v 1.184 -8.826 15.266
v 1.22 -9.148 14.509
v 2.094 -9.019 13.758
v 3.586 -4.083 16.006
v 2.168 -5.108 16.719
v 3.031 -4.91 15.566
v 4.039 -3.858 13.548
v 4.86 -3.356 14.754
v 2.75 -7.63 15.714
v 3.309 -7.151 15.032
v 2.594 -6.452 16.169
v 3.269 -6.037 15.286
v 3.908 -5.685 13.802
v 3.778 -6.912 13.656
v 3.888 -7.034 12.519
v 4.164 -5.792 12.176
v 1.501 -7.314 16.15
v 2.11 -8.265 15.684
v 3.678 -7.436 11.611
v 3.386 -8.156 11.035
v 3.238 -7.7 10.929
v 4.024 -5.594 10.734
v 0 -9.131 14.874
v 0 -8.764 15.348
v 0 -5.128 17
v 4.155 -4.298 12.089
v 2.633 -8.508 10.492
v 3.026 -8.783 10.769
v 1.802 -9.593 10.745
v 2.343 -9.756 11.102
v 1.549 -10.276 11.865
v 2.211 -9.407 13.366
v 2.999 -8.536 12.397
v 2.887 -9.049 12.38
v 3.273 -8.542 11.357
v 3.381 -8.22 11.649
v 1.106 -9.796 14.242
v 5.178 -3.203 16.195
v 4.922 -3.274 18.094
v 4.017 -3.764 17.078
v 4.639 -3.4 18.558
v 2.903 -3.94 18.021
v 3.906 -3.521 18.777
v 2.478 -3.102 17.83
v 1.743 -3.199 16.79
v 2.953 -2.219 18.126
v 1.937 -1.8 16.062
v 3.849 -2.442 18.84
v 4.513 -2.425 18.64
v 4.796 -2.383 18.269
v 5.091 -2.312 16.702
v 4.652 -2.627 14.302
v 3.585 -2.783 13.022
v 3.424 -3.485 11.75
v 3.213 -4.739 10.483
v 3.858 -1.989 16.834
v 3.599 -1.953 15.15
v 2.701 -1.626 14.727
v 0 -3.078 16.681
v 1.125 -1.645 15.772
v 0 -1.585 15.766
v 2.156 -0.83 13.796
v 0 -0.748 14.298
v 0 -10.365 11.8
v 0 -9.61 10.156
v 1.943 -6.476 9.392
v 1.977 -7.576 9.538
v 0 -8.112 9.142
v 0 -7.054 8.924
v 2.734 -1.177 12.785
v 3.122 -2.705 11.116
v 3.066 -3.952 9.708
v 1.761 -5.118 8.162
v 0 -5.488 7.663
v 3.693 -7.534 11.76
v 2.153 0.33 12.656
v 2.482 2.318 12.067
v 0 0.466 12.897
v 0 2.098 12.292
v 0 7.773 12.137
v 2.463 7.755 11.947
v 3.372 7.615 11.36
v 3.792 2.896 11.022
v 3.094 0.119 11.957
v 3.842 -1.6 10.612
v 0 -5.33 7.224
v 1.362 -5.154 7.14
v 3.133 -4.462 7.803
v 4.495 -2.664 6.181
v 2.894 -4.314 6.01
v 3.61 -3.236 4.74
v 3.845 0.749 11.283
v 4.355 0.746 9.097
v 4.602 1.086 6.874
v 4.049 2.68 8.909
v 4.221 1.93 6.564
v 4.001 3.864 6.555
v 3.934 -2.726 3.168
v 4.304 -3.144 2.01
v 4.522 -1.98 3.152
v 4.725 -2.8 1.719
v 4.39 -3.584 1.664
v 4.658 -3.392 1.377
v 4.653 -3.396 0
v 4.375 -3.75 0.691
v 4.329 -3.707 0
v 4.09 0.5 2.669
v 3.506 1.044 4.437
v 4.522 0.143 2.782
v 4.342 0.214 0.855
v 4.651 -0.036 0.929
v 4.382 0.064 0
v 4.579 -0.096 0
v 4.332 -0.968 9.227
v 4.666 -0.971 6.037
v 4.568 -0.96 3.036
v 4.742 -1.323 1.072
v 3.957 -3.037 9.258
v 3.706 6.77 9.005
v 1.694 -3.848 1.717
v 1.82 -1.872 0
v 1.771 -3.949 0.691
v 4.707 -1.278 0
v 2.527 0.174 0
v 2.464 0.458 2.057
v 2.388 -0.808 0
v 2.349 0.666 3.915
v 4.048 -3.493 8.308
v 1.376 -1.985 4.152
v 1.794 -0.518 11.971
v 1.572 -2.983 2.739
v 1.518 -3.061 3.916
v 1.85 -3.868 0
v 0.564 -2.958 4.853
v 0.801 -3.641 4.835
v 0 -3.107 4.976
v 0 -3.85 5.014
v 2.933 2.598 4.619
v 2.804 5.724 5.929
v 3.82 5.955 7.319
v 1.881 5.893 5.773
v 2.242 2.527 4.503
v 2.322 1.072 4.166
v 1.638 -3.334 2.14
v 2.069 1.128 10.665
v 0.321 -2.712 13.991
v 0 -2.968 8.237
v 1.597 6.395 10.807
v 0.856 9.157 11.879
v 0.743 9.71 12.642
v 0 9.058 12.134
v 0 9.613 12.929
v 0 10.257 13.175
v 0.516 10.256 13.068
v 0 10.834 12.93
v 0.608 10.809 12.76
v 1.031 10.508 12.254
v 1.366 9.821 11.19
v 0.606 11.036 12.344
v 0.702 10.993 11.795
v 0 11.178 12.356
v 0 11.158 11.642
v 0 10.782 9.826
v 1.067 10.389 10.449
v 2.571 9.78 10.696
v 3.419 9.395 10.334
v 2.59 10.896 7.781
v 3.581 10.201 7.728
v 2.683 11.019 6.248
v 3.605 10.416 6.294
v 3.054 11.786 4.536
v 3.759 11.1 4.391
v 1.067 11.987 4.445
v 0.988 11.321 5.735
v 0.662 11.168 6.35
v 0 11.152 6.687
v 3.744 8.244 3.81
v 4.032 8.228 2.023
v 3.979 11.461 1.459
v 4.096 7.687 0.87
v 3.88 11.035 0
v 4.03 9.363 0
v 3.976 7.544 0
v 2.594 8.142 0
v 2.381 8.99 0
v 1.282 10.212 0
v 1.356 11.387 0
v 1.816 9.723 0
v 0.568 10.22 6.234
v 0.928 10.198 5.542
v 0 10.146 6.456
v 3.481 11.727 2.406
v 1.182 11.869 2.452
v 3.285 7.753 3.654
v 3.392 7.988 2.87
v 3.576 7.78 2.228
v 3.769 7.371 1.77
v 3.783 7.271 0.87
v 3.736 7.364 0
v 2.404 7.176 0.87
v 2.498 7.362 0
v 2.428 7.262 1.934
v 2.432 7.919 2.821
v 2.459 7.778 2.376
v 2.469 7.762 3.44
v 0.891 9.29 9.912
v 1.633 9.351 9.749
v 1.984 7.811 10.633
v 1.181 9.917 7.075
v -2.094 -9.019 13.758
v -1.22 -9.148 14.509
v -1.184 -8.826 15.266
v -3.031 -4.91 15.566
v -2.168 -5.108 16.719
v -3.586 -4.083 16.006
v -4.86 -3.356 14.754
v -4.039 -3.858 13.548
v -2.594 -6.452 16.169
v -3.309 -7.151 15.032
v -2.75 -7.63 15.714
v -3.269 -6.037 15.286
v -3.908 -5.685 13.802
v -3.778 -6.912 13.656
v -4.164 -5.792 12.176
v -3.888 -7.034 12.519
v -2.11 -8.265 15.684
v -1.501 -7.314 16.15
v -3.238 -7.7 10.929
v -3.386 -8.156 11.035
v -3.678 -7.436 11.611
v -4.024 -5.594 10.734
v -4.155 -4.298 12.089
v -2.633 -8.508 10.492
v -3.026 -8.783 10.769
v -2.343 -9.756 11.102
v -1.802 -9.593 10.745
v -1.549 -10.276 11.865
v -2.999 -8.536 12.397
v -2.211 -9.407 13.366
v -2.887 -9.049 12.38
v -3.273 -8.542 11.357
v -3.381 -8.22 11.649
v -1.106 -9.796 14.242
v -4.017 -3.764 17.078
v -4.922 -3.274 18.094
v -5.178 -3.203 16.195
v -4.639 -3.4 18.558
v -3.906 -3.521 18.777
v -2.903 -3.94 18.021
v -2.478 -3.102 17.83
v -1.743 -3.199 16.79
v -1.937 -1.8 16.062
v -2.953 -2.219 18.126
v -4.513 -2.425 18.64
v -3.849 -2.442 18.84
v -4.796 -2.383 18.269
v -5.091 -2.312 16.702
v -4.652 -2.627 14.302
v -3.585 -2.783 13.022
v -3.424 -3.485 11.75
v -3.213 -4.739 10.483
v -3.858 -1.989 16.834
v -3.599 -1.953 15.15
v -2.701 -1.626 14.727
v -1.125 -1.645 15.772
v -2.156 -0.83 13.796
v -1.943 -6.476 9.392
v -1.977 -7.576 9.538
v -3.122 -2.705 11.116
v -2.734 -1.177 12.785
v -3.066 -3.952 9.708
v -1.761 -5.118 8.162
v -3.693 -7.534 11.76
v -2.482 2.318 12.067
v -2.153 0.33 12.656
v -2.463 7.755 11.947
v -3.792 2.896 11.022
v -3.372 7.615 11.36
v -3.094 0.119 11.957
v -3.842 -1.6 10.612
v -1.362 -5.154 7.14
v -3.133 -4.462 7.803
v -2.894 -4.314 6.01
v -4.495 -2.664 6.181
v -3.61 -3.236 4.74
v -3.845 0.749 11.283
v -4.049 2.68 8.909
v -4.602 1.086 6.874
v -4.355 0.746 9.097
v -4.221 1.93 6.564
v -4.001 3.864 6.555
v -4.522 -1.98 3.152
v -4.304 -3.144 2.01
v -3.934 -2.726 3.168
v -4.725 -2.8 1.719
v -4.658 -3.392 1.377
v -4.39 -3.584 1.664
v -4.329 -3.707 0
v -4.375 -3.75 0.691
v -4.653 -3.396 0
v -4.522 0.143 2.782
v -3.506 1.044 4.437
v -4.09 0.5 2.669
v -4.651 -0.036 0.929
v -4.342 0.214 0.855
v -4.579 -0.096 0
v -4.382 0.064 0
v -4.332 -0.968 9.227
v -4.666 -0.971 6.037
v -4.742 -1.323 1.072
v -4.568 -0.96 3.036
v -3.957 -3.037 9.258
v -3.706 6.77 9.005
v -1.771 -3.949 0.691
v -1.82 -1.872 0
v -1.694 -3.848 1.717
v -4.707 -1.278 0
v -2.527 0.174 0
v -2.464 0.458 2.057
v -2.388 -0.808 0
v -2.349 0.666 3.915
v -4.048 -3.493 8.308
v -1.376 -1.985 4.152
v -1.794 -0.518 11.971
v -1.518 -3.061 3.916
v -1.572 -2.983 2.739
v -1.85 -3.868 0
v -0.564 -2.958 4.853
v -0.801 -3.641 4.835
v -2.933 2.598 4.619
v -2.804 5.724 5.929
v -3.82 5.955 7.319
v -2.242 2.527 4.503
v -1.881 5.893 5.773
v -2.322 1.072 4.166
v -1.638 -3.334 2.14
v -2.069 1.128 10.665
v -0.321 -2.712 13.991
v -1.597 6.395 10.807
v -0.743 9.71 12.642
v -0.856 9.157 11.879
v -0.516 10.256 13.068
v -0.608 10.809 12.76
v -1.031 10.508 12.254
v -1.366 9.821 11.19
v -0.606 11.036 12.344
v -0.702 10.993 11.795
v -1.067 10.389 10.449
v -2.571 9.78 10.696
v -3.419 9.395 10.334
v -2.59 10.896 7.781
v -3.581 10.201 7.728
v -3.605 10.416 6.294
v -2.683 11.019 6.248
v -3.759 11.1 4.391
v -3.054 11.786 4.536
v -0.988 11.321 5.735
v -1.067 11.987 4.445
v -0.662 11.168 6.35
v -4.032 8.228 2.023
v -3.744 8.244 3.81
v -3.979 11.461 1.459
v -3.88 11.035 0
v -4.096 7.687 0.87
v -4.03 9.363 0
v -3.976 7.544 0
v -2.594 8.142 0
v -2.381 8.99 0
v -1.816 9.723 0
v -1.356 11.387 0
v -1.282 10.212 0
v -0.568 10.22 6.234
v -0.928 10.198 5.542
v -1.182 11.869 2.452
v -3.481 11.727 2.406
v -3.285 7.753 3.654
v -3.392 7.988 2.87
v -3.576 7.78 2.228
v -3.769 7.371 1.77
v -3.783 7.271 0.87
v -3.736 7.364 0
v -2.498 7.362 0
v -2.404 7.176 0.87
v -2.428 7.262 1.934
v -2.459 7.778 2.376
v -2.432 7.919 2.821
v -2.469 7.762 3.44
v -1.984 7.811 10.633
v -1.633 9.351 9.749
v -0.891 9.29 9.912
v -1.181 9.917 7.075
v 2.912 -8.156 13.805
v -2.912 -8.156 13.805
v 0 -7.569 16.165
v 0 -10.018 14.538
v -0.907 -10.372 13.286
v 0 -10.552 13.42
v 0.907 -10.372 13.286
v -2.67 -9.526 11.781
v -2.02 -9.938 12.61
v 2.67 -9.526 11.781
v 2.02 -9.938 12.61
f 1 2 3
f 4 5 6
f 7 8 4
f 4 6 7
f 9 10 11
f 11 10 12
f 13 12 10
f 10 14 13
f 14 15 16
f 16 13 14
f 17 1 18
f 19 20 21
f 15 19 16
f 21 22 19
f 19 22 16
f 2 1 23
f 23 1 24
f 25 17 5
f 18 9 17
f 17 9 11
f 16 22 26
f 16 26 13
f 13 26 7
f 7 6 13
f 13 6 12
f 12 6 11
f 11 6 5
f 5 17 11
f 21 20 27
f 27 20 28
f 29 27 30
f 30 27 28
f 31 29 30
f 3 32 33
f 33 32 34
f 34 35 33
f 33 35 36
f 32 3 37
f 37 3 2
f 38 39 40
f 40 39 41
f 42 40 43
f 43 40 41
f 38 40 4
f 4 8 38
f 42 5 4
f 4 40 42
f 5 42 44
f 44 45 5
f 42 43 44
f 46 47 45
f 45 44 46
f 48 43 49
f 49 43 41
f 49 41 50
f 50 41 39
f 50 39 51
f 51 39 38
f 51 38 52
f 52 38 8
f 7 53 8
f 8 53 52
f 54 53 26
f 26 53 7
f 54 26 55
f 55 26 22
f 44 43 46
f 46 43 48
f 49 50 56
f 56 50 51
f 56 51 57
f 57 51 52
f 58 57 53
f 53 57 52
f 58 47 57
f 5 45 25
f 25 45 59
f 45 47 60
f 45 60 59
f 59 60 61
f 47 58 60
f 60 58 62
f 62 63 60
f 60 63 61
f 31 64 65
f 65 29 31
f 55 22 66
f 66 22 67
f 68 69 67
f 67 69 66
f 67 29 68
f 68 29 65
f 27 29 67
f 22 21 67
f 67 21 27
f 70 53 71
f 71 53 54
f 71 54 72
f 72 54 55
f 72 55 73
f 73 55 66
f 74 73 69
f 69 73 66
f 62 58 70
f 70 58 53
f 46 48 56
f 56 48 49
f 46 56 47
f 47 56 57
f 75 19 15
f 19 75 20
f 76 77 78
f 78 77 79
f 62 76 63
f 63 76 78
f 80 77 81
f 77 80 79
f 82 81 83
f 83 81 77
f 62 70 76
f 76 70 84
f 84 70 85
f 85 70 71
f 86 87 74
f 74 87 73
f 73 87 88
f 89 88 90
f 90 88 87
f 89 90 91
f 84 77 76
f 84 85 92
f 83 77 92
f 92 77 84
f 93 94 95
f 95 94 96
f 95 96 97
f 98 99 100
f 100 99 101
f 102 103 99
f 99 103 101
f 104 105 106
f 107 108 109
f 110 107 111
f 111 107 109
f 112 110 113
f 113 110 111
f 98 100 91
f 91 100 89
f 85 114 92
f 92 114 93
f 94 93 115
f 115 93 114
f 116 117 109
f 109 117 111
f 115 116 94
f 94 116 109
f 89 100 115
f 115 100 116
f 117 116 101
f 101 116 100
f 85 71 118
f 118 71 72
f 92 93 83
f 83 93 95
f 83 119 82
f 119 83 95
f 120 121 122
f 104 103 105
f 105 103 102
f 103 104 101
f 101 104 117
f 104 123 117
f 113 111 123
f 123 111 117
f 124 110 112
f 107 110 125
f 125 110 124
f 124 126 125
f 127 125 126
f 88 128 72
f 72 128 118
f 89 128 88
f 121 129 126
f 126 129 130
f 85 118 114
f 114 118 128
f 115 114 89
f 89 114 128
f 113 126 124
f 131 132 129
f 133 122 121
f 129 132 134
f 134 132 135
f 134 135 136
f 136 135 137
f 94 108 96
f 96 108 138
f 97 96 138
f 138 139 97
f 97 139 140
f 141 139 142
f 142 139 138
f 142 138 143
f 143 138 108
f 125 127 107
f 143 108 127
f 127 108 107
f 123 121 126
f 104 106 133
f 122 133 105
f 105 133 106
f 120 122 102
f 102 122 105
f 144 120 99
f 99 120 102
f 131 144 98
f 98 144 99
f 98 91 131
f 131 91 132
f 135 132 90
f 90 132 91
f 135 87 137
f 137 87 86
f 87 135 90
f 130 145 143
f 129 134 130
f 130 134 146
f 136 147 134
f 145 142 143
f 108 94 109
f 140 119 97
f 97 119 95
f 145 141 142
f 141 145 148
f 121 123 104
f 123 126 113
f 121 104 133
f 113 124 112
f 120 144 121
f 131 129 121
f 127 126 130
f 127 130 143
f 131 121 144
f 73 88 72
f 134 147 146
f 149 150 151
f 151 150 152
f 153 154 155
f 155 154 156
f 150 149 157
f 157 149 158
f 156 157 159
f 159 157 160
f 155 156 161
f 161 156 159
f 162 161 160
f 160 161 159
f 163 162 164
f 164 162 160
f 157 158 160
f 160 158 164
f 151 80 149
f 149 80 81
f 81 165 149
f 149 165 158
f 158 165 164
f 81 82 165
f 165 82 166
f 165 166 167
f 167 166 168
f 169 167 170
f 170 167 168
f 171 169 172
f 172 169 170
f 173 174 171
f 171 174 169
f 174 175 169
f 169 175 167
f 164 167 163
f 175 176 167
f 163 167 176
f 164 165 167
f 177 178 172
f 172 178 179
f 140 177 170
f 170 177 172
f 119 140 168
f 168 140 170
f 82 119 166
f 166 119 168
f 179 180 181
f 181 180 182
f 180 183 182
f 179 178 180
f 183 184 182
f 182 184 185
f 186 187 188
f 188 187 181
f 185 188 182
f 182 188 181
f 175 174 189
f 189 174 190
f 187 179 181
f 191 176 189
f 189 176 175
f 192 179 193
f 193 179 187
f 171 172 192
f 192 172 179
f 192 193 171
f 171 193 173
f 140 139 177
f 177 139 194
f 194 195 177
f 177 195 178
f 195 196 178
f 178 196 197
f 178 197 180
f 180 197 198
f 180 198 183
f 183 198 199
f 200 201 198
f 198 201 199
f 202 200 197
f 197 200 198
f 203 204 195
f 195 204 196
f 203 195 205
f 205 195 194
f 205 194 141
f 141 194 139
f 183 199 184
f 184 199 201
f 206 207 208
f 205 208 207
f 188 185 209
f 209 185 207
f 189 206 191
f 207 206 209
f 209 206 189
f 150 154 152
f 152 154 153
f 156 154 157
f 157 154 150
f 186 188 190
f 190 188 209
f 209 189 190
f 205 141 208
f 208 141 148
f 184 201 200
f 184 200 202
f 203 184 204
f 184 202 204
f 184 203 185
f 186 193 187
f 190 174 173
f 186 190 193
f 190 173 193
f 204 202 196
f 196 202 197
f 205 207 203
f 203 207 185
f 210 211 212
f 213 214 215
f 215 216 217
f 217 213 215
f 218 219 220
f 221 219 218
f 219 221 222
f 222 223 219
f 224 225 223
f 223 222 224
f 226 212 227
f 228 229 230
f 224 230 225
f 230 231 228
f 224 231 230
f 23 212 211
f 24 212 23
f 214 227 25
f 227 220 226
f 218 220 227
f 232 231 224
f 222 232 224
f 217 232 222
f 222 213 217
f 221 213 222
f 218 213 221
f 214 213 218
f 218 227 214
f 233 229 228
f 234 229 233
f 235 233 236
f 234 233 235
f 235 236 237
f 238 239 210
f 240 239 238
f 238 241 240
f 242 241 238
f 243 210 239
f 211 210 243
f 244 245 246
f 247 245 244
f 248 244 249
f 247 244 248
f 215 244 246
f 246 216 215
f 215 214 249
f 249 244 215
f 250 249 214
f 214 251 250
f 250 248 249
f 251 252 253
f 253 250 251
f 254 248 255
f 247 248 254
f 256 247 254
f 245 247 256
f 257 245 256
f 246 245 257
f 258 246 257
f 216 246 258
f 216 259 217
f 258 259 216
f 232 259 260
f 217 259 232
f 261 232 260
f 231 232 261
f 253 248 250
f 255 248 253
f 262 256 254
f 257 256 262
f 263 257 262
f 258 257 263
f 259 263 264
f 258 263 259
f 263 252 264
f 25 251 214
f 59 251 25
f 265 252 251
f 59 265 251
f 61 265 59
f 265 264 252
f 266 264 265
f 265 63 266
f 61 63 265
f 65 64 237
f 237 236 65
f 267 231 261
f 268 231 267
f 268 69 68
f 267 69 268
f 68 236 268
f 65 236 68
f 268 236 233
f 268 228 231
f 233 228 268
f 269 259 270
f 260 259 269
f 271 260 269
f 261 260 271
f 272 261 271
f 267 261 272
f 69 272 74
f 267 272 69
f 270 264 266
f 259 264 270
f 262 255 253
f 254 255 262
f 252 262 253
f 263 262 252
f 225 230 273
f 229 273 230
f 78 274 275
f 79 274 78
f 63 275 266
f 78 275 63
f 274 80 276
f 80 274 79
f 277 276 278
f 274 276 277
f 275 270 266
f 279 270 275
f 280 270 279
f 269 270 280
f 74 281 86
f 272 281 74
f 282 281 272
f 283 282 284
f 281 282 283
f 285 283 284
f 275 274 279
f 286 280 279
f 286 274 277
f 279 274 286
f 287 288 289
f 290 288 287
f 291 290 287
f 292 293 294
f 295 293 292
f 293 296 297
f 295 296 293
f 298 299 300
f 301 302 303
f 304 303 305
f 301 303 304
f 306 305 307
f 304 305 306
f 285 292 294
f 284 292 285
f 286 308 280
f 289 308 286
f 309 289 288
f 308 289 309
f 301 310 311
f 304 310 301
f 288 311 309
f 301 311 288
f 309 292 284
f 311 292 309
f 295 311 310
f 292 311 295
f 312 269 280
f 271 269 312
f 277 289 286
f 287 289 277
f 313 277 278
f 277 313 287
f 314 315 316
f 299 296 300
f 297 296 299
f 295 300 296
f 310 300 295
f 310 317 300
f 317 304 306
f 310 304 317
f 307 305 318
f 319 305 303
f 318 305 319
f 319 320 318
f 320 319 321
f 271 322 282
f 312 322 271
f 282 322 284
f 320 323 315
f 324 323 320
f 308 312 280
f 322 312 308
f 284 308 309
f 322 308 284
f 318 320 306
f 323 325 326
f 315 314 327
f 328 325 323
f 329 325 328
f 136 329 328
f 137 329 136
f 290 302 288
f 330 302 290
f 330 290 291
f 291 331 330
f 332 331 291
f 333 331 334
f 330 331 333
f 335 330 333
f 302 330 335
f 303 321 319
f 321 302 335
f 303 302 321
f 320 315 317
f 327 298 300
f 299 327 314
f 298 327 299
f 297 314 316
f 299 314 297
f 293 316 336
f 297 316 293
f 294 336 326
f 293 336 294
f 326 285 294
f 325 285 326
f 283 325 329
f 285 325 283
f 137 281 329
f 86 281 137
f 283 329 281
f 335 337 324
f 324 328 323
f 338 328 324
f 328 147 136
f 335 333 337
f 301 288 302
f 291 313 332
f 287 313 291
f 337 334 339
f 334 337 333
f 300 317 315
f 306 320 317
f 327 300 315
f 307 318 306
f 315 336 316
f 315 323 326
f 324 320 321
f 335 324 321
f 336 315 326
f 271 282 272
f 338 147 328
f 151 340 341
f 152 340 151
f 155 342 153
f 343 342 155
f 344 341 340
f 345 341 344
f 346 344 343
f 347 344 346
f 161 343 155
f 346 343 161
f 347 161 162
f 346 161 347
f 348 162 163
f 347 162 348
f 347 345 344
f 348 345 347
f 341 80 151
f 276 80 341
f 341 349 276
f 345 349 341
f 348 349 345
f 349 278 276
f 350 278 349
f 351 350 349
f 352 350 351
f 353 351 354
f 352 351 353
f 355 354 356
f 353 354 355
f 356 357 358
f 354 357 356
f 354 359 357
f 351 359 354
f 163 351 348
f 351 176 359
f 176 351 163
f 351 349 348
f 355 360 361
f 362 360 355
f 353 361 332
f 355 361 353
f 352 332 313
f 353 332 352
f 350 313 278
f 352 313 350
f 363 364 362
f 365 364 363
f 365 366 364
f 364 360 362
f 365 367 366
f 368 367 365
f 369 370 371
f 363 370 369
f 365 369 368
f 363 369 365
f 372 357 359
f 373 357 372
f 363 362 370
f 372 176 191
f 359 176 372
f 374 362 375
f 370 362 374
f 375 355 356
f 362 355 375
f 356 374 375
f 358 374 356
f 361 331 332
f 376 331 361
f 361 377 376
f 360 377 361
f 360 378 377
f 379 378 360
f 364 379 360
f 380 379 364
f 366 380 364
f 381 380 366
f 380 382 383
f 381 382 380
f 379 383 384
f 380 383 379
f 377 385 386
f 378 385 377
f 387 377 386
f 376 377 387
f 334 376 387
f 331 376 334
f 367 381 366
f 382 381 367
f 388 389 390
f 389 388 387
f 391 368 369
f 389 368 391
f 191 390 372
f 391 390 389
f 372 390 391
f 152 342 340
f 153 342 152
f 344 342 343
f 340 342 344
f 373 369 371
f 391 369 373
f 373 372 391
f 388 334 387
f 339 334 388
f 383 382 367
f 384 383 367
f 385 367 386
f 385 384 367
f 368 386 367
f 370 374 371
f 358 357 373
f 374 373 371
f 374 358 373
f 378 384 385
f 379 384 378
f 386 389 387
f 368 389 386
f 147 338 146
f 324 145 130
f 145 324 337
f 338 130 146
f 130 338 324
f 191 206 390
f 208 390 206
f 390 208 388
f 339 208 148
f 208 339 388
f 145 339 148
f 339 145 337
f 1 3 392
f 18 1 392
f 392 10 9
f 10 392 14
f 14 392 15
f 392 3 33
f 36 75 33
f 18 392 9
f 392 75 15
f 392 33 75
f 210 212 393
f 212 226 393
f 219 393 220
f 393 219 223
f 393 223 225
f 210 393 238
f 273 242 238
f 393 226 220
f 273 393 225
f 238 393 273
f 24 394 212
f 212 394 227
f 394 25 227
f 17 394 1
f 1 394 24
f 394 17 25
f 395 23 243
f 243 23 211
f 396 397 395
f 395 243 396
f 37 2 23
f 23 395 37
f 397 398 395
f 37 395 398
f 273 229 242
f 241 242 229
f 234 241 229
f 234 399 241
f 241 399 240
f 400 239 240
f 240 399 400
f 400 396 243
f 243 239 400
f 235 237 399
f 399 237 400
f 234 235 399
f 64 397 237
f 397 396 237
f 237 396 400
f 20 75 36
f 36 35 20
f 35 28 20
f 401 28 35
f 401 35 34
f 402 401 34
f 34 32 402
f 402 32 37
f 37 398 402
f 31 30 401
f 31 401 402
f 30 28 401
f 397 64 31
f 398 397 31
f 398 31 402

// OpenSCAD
use <../lib.scad>
use <s/29602s01.scad>
function ldraw_lib__29602() = [
// 0 Animal Dog French Bulldog
// 0 Name: 29602.dat
// 0 Author: Gerald Lasser [GeraldLasser]
// 0 !LDRAW_ORG Part UPDATE 2022-04
// 0 !LICENSE Licensed under CC BY 4.0 : see CAreadme.txt
// 
// 0 BFC CERTIFY CCW
  [0,"BFC","CERTIFY"],
  [0,"BFC","CCW"],
// 
// 0 !HISTORY 2018-01-28 {LEGO Digital Designer} Original part shape
// 0 !HISTORY 2018-01-28 [GeraldLasser] File preparation for LDraw Parts Tracker
// 0 !HISTORY 2022-07-18 [PTadmin] Official Update 2022-04
// 
// 
// 1 16 0 0 0 1 0 0 0 1 0 0 0 1 s\29602s01.dat
  [1,16,0,0,0,1,0,0,0,1,0,0,0,1, ldraw_lib__s__29602s01()],
// 1 16 0 0 0 -1 0 0 0 1 0 0 0 1 s\29602s01.dat
  [1,16,0,0,0,-1,0,0,0,1,0,0,0,1, ldraw_lib__s__29602s01()],
// 
// 3 16 0 -20.592 -7.42 -.803 -34.978 -6.781 .803 -34.978 -6.781
  [3,16,0,-20.592,-7.42,-.803,-34.978,-6.781,.803,-34.978,-6.781],
// 4 16 5.172 -26.662 2.821 4.486 -29.927 -1.294 -4.486 -29.927 -1.294 -5.172 -26.662 2.821
  [4,16,5.172,-26.662,2.821,4.486,-29.927,-1.294,-4.486,-29.927,-1.294,-5.172,-26.662,2.821],
// 4 16 -4.486 -29.927 -1.294 4.486 -29.927 -1.294 .803 -34.978 -6.781 -.803 -34.978 -6.781
  [4,16,-4.486,-29.927,-1.294,4.486,-29.927,-1.294,.803,-34.978,-6.781,-.803,-34.978,-6.781],
// 3 16 0 -16.141 25.365 2.227 -24.779 23.226 -2.227 -24.779 23.226
  [3,16,0,-16.141,25.365,2.227,-24.779,23.226,-2.227,-24.779,23.226],
// 4 16 2.227 -24.779 23.226 4.961 -26.582 19.527 -4.961 -26.582 19.527 -2.227 -24.779 23.226
  [4,16,2.227,-24.779,23.226,4.961,-26.582,19.527,-4.961,-26.582,19.527,-2.227,-24.779,23.226],
// 4 16 -3.992 -27.018 15.988 -4.961 -26.582 19.527 4.961 -26.582 19.527 3.992 -27.018 15.988
  [4,16,-3.992,-27.018,15.988,-4.961,-26.582,19.527,4.961,-26.582,19.527,3.992,-27.018,15.988],
// 4 16 -5.172 -26.662 2.821 -3.992 -27.018 15.988 3.992 -27.018 15.988 5.172 -26.662 2.821
  [4,16,-5.172,-26.662,2.821,-3.992,-27.018,15.988,3.992,-27.018,15.988,5.172,-26.662,2.821],
// 2 24 -.803 -34.978 -6.781 .803 -34.978 -6.781
  [2,24,-.803,-34.978,-6.781,.803,-34.978,-6.781],
// 
// 5 24 4.961 -26.582 19.527 -4.961 -26.582 19.527 -2.227 -24.779 23.226 3.992 -27.018 15.988
  [5,24,4.961,-26.582,19.527,-4.961,-26.582,19.527,-2.227,-24.779,23.226,3.992,-27.018,15.988],
// 5 24 4.486 -29.927 -1.294 -4.486 -29.927 -1.294 .803 -34.978 -6.781 5.172 -26.662 2.821
  [5,24,4.486,-29.927,-1.294,-4.486,-29.927,-1.294,.803,-34.978,-6.781,5.172,-26.662,2.821],
// 5 24 -3.992 -27.018 15.988 3.992 -27.018 15.988 -4.961 -26.582 19.527 5.172 -26.662 2.821
  [5,24,-3.992,-27.018,15.988,3.992,-27.018,15.988,-4.961,-26.582,19.527,5.172,-26.662,2.821],
// 5 24 2.227 -24.779 23.226 -2.227 -24.779 23.226 0 -16.141 25.365 4.961 -26.582 19.527
  [5,24,2.227,-24.779,23.226,-2.227,-24.779,23.226,0,-16.141,25.365,4.961,-26.582,19.527],
// 5 24 -5.172 -26.662 2.821 5.172 -26.662 2.821 4.486 -29.927 -1.294 -3.992 -27.018 15.988
  [5,24,-5.172,-26.662,2.821,5.172,-26.662,2.821,4.486,-29.927,-1.294,-3.992,-27.018,15.988],
// 
// 0 // Condlines Merge
// 5 24 0 -12.441 -7.768 0 -20.592 -7.42 1.41 -12.132 -7.396 -1.41 -12.132 -7.396
  [5,24,0,-12.441,-7.768,0,-20.592,-7.42,1.41,-12.132,-7.396,-1.41,-12.132,-7.396],
// 5 24 0 -12.441 -7.768 0 -12.534 -9.626 2.003 -12.088 -9.102 -2.003 -12.088 -9.102
  [5,24,0,-12.441,-7.768,0,-12.534,-9.626,2.003,-12.088,-9.102,-2.003,-12.088,-9.102],
// 5 24 0 -12.534 -9.626 0 -18.06 -13.325 -3.404 -17.849 -12.884 3.404 -17.849 -12.884
  [5,24,0,-12.534,-9.626,0,-18.06,-13.325,-3.404,-17.849,-12.884,3.404,-17.849,-12.884],
// 5 24 0 -19.157 -13.719 0 -18.06 -13.325 -3.404 -17.849 -12.884 3.404 -17.849 -12.884
  [5,24,0,-19.157,-13.719,0,-18.06,-13.325,-3.404,-17.849,-12.884,3.404,-17.849,-12.884],
// 5 24 0 -19.157 -13.719 0 -22.309 -17.636 4.857 -23.481 -16.189 -4.857 -23.481 -16.189
  [5,24,0,-19.157,-13.719,0,-22.309,-17.636,4.857,-23.481,-16.189,-4.857,-23.481,-16.189],
// 5 24 0 -22.854 -20.28 0 -22.309 -17.636 4.943 -23.845 -18.941 -4.943 -23.845 -18.941
  [5,24,0,-22.854,-20.28,0,-22.309,-17.636,4.943,-23.845,-18.941,-4.943,-23.845,-18.941],
// 5 24 0 -22.854 -20.28 0 -25.389 -24.026 -4.505 -26.862 -23.982 4.505 -26.862 -23.982
  [5,24,0,-22.854,-20.28,0,-25.389,-24.026,-4.505,-26.862,-23.982,4.505,-26.862,-23.982],
// 5 24 0 -42.499 -12.821 0 -41.703 -7.696 4.357 -41.975 -7.997 -4.357 -41.975 -7.997
  [5,24,0,-42.499,-12.821,0,-41.703,-7.696,4.357,-41.975,-7.997,-4.357,-41.975,-7.997],
// 5 24 0 -25.389 -24.026 0 -29.499 -25.912 3.872 -29.662 -25.69 -3.872 -29.662 -25.69
  [5,24,0,-25.389,-24.026,0,-29.499,-25.912,3.872,-29.662,-25.69,-3.872,-29.662,-25.69],
// 
// 5 24 0 -41.703 -7.696 0 -39.414 -3.962 2.812 -39.429 -4.112 -2.812 -39.429 -4.112
  [5,24,0,-41.703,-7.696,0,-39.414,-3.962,2.812,-39.429,-4.112,-2.812,-39.429,-4.112],
// 5 24 0 -35.744 -1.871 0 -39.414 -3.962 2.812 -39.429 -4.112 -2.812 -39.429 -4.112
  [5,24,0,-35.744,-1.871,0,-39.414,-3.962,2.812,-39.429,-4.112,-2.812,-39.429,-4.112],
// 5 24 0 -32.243 1.166 0 -35.744 -1.871 5.382 -31.641 .824 -5.382 -31.641 .824
  [5,24,0,-32.243,1.166,0,-35.744,-1.871,5.382,-31.641,.824,-5.382,-31.641,.824],
// 5 24 0 -30.729 5.245 0 -32.243 1.166 5.382 -31.641 .824 -5.382 -31.641 .824
  [5,24,0,-30.729,5.245,0,-32.243,1.166,5.382,-31.641,.824,-5.382,-31.641,.824],
// 5 24 0 -30.342 19.433 0 -30.729 5.245 6.205 -30.167 5.796 -6.205 -30.167 5.796
  [5,24,0,-30.342,19.433,0,-30.729,5.245,6.205,-30.167,5.796,-6.205,-30.167,5.796],
// 5 24 0 -30.342 19.433 0 -30.334 22.646 2.141 -29.697 22.893 -2.141 -29.697 22.893
  [5,24,0,-30.342,19.433,0,-30.334,22.646,2.141,-29.697,22.893,-2.141,-29.697,22.893],
// 5 24 0 -30.334 22.646 0 -32.322 24.032 1.857 -31.605 24.276 -1.857 -31.605 24.276
  [5,24,0,-30.334,22.646,0,-32.322,24.032,1.857,-31.605,24.276,-1.857,-31.605,24.276],
// 5 24 0 -32.322 24.032 0 -32.938 25.642 1.291 -32.67 25.639 -1.291 -32.67 25.639
  [5,24,0,-32.322,24.032,0,-32.938,25.642,1.291,-32.67,25.639,-1.291,-32.67,25.639],
// 5 24 0 -32.324 27.084 0 -32.938 25.642 1.291 -32.67 25.639 -1.291 -32.67 25.639
  [5,24,0,-32.324,27.084,0,-32.938,25.642,1.291,-32.67,25.639,-1.291,-32.67,25.639],
// 5 24 0 -30.891 27.944 0 -32.324 27.084 1.519 -31.899 27.022 -1.519 -31.899 27.022
  [5,24,0,-30.891,27.944,0,-32.324,27.084,1.519,-31.899,27.022,-1.519,-31.899,27.022],
// 5 24 0 -29.105 27.896 0 -30.891 27.944 1.756 -29.488 27.483 -1.756 -29.488 27.483
  [5,24,0,-29.105,27.896,0,-30.891,27.944,1.756,-29.488,27.483,-1.756,-29.488,27.483],
// 5 24 0 -24.564 26.955 0 -29.105 27.896 -2.667 -26.123 25.972 2.667 -26.123 25.972
  [5,24,0,-24.564,26.955,0,-29.105,27.896,-2.667,-26.123,25.972,2.667,-26.123,25.972],
// 5 24 0 -16.717 27.88 0 -24.564 26.955 6.474 -19.452 27.241 -6.474 -19.452 27.241
  [5,24,0,-16.717,27.88,0,-24.564,26.955,6.474,-19.452,27.241,-6.474,-19.452,27.241],
// 5 24 0 -16.141 25.365 0 -16.717 27.88 1.654 -15.874 27.921 -1.654 -15.874 27.921
  [5,24,0,-16.141,25.365,0,-16.717,27.88,1.654,-15.874,27.921,-1.654,-15.874,27.921],
// 5 24 0 -37.185 -22.828 0 -38.371 -21.91 2.961 -38.164 -22.064 -2.961 -38.164 -22.064
  [5,24,0,-37.185,-22.828,0,-38.371,-21.91,2.961,-38.164,-22.064,-2.961,-38.164,-22.064],
// 5 24 0 -36.346 -25.044 0 -37.185 -22.828 -2.765 -35.604 -24.49 2.765 -35.604 -24.49
  [5,24,0,-36.346,-25.044,0,-37.185,-22.828,-2.765,-35.604,-24.49,2.765,-35.604,-24.49],
// 5 24 0 -36.346 -25.044 0 -33.549 -26.379 2.267 -33.215 -25.931 -2.267 -33.215 -25.931
  [5,24,0,-36.346,-25.044,0,-33.549,-26.379,2.267,-33.215,-25.931,-2.267,-33.215,-25.931],
// 5 24 0 -33.549 -26.379 0 -29.499 -25.912 3.872 -29.662 -25.69 -3.872 -29.662 -25.69
  [5,24,0,-33.549,-26.379,0,-29.499,-25.912,3.872,-29.662,-25.69,-3.872,-29.662,-25.69],
// 
// 0 // Plain Areas
// 3 16 2.961 -38.164 -22.064 5.234 -34.396 -22.547 7.279 -34.513 -20.391
  [3,16,2.961,-38.164,-22.064,5.234,-34.396,-22.547,7.279,-34.513,-20.391],
// 3 16 5.274 -39.21 -20.663 2.961 -38.164 -22.064 7.279 -34.513 -20.391
  [3,16,5.274,-39.21,-20.663,2.961,-38.164,-22.064,7.279,-34.513,-20.391],
// 3 16 7.279 -34.513 -20.391 8.272 -37.581 -17.878 6.874 -39.285 -19.076
  [3,16,7.279,-34.513,-20.391,8.272,-37.581,-17.878,6.874,-39.285,-19.076],
// 3 16 8.272 -37.581 -17.878 7.279 -34.513 -20.391 9.445 -34.14 -17.279
  [3,16,8.272,-37.581,-17.878,7.279,-34.513,-20.391,9.445,-34.14,-17.279],
// 3 16 9.445 -34.14 -17.279 7.279 -34.513 -20.391 9.72 -31.297 -17.585
  [3,16,9.445,-34.14,-17.279,7.279,-34.513,-20.391,9.72,-31.297,-17.585],
// 3 16 7.279 -34.513 -20.391 5.234 -34.396 -22.547 7.497 -30.993 -21.339
  [3,16,7.279,-34.513,-20.391,5.234,-34.396,-22.547,7.497,-30.993,-21.339],
// 3 16 8.452 -29.123 -20.55 9.232 -29.4 -18.834 7.497 -30.993 -21.339
  [3,16,8.452,-29.123,-20.55,9.232,-29.4,-18.834,7.497,-30.993,-21.339],
// 3 16 5.274 -39.21 -20.663 7.279 -34.513 -20.391 6.874 -39.285 -19.076
  [3,16,5.274,-39.21,-20.663,7.279,-34.513,-20.391,6.874,-39.285,-19.076],
// 3 16 7.279 -34.513 -20.391 9.232 -29.4 -18.834 9.72 -31.297 -17.585
  [3,16,7.279,-34.513,-20.391,9.232,-29.4,-18.834,9.72,-31.297,-17.585],
// 3 16 7.279 -34.513 -20.391 7.497 -30.993 -21.339 9.232 -29.4 -18.834
  [3,16,7.279,-34.513,-20.391,7.497,-30.993,-21.339,9.232,-29.4,-18.834],
// 3 16 -5.234 -34.396 -22.547 -2.961 -38.164 -22.064 -7.279 -34.513 -20.391
  [3,16,-5.234,-34.396,-22.547,-2.961,-38.164,-22.064,-7.279,-34.513,-20.391],
// 3 16 -2.961 -38.164 -22.064 -5.274 -39.21 -20.663 -7.279 -34.513 -20.391
  [3,16,-2.961,-38.164,-22.064,-5.274,-39.21,-20.663,-7.279,-34.513,-20.391],
// 3 16 -8.272 -37.581 -17.878 -7.279 -34.513 -20.391 -6.874 -39.285 -19.076
  [3,16,-8.272,-37.581,-17.878,-7.279,-34.513,-20.391,-6.874,-39.285,-19.076],
// 3 16 -7.279 -34.513 -20.391 -8.272 -37.581 -17.878 -9.445 -34.14 -17.279
  [3,16,-7.279,-34.513,-20.391,-8.272,-37.581,-17.878,-9.445,-34.14,-17.279],
// 3 16 -7.279 -34.513 -20.391 -9.445 -34.14 -17.279 -9.72 -31.297 -17.585
  [3,16,-7.279,-34.513,-20.391,-9.445,-34.14,-17.279,-9.72,-31.297,-17.585],
// 3 16 -5.234 -34.396 -22.547 -7.279 -34.513 -20.391 -7.497 -30.993 -21.339
  [3,16,-5.234,-34.396,-22.547,-7.279,-34.513,-20.391,-7.497,-30.993,-21.339],
// 3 16 -9.232 -29.4 -18.834 -8.452 -29.123 -20.55 -7.497 -30.993 -21.339
  [3,16,-9.232,-29.4,-18.834,-8.452,-29.123,-20.55,-7.497,-30.993,-21.339],
// 3 16 -7.279 -34.513 -20.391 -5.274 -39.21 -20.663 -6.874 -39.285 -19.076
  [3,16,-7.279,-34.513,-20.391,-5.274,-39.21,-20.663,-6.874,-39.285,-19.076],
// 3 16 -9.232 -29.4 -18.834 -7.279 -34.513 -20.391 -9.72 -31.297 -17.585
  [3,16,-9.232,-29.4,-18.834,-7.279,-34.513,-20.391,-9.72,-31.297,-17.585],
// 3 16 -7.497 -30.993 -21.339 -7.279 -34.513 -20.391 -9.232 -29.4 -18.834
  [3,16,-7.497,-30.993,-21.339,-7.279,-34.513,-20.391,-9.232,-29.4,-18.834],
// 
// 0 // Forehead
// 3 16 0 -38.371 -21.91 0 -40.413 -18.922 -2.961 -38.164 -22.064
  [3,16,0,-38.371,-21.91,0,-40.413,-18.922,-2.961,-38.164,-22.064],
// 3 16 -2.961 -38.164 -22.064 0 -40.413 -18.922 -3.752 -40.374 -18.286
  [3,16,-2.961,-38.164,-22.064,0,-40.413,-18.922,-3.752,-40.374,-18.286],
// 3 16 0 -40.413 -18.922 0 -42.499 -12.821 -3.752 -40.374 -18.286
  [3,16,0,-40.413,-18.922,0,-42.499,-12.821,-3.752,-40.374,-18.286],
// 3 16 3.752 -40.374 -18.286 0 -40.413 -18.922 2.961 -38.164 -22.064
  [3,16,3.752,-40.374,-18.286,0,-40.413,-18.922,2.961,-38.164,-22.064],
// 3 16 2.961 -38.164 -22.064 0 -40.413 -18.922 0 -38.371 -21.91
  [3,16,2.961,-38.164,-22.064,0,-40.413,-18.922,0,-38.371,-21.91],
// 3 16 0 -40.413 -18.922 3.752 -40.374 -18.286 0 -42.499 -12.821
  [3,16,0,-40.413,-18.922,3.752,-40.374,-18.286,0,-42.499,-12.821],
// 
// 0 // Nose
// 3 16 0 -36.346 -25.044 0 -37.185 -22.828 -2.765 -35.604 -24.49
  [3,16,0,-36.346,-25.044,0,-37.185,-22.828,-2.765,-35.604,-24.49],
// 3 16 -2.765 -35.604 -24.49 0 -37.185 -22.828 -3.05 -36.272 -22.871
  [3,16,-2.765,-35.604,-24.49,0,-37.185,-22.828,-3.05,-36.272,-22.871],
// 3 16 -2.267 -33.215 -25.931 0 -33.549 -26.379 0 -36.346 -25.044
  [3,16,-2.267,-33.215,-25.931,0,-33.549,-26.379,0,-36.346,-25.044],
// 3 16 0 -36.346 -25.044 -2.765 -35.604 -24.49 -2.267 -33.215 -25.931
  [3,16,0,-36.346,-25.044,-2.765,-35.604,-24.49,-2.267,-33.215,-25.931],
// 3 16 2.765 -35.604 -24.49 3.05 -36.272 -22.871 0 -37.185 -22.828
  [3,16,2.765,-35.604,-24.49,3.05,-36.272,-22.871,0,-37.185,-22.828],
// 3 16 0 -37.185 -22.828 0 -36.346 -25.044 2.765 -35.604 -24.49
  [3,16,0,-37.185,-22.828,0,-36.346,-25.044,2.765,-35.604,-24.49],
// 3 16 0 -33.549 -26.379 2.267 -33.215 -25.931 0 -36.346 -25.044
  [3,16,0,-33.549,-26.379,2.267,-33.215,-25.931,0,-36.346,-25.044],
// 3 16 2.765 -35.604 -24.49 0 -36.346 -25.044 2.267 -33.215 -25.931
  [3,16,2.765,-35.604,-24.49,0,-36.346,-25.044,2.267,-33.215,-25.931],
// 
// 0 // Mouth
// 3 16 -9.232 -29.4 -18.834 -8.464 -27.587 -20.39 -8.452 -29.123 -20.55
  [3,16,-9.232,-29.4,-18.834,-8.464,-27.587,-20.39,-8.452,-29.123,-20.55],
// 3 16 -8.183 -28.392 -21.354 -8.452 -29.123 -20.55 -8.464 -27.587 -20.39
  [3,16,-8.183,-28.392,-21.354,-8.452,-29.123,-20.55,-8.464,-27.587,-20.39],
// 3 16 -7.564 -26.922 -21.957 -8.183 -28.392 -21.354 -8.464 -27.587 -20.39
  [3,16,-7.564,-26.922,-21.957,-8.183,-28.392,-21.354,-8.464,-27.587,-20.39],
// 3 16 -7.564 -26.922 -21.957 -6.676 -29.453 -23.815 -8.183 -28.392 -21.354
  [3,16,-7.564,-26.922,-21.957,-6.676,-29.453,-23.815,-8.183,-28.392,-21.354],
// 3 16 -8.183 -28.392 -21.354 -6.676 -29.453 -23.815 -7.218 -30.949 -22.622
  [3,16,-8.183,-28.392,-21.354,-6.676,-29.453,-23.815,-7.218,-30.949,-22.622],
// 3 16 -5.05 -31.524 -24.844 -5.528 -33.415 -23.518 -7.218 -30.949 -22.622
  [3,16,-5.05,-31.524,-24.844,-5.528,-33.415,-23.518,-7.218,-30.949,-22.622],
// 3 16 -7.218 -30.949 -22.622 -6.676 -29.453 -23.815 -5.05 -31.524 -24.844
  [3,16,-7.218,-30.949,-22.622,-6.676,-29.453,-23.815,-5.05,-31.524,-24.844],
// 3 16 -5.05 -31.524 -24.844 -2.267 -33.215 -25.931 -2.765 -35.604 -24.49
  [3,16,-5.05,-31.524,-24.844,-2.267,-33.215,-25.931,-2.765,-35.604,-24.49],
// 3 16 -2.765 -35.604 -24.49 -5.528 -33.415 -23.518 -5.05 -31.524 -24.844
  [3,16,-2.765,-35.604,-24.49,-5.528,-33.415,-23.518,-5.05,-31.524,-24.844],
// 3 16 -5.858 -27.756 -24.389 -3.872 -29.662 -25.69 -6.676 -29.453 -23.815
  [3,16,-5.858,-27.756,-24.389,-3.872,-29.662,-25.69,-6.676,-29.453,-23.815],
// 3 16 -6.676 -29.453 -23.815 -3.872 -29.662 -25.69 -5.05 -31.524 -24.844
  [3,16,-6.676,-29.453,-23.815,-3.872,-29.662,-25.69,-5.05,-31.524,-24.844],
// 3 16 -7.564 -26.922 -21.957 -5.858 -27.756 -24.389 -6.676 -29.453 -23.815
  [3,16,-7.564,-26.922,-21.957,-5.858,-27.756,-24.389,-6.676,-29.453,-23.815],
// 3 16 0 -29.499 -25.912 0 -33.549 -26.379 -3.872 -29.662 -25.69
  [3,16,0,-29.499,-25.912,0,-33.549,-26.379,-3.872,-29.662,-25.69],
// 3 16 0 -33.549 -26.379 -2.267 -33.215 -25.931 -3.872 -29.662 -25.69
  [3,16,0,-33.549,-26.379,-2.267,-33.215,-25.931,-3.872,-29.662,-25.69],
// 3 16 -3.872 -29.662 -25.69 -2.267 -33.215 -25.931 -5.05 -31.524 -24.844
  [3,16,-3.872,-29.662,-25.69,-2.267,-33.215,-25.931,-5.05,-31.524,-24.844],
// 
// 3 16 8.464 -27.587 -20.39 9.232 -29.4 -18.834 8.452 -29.123 -20.55
  [3,16,8.464,-27.587,-20.39,9.232,-29.4,-18.834,8.452,-29.123,-20.55],
// 3 16 8.452 -29.123 -20.55 8.183 -28.392 -21.354 8.464 -27.587 -20.39
  [3,16,8.452,-29.123,-20.55,8.183,-28.392,-21.354,8.464,-27.587,-20.39],
// 3 16 8.183 -28.392 -21.354 7.564 -26.922 -21.957 8.464 -27.587 -20.39
  [3,16,8.183,-28.392,-21.354,7.564,-26.922,-21.957,8.464,-27.587,-20.39],
// 3 16 6.676 -29.453 -23.815 7.564 -26.922 -21.957 8.183 -28.392 -21.354
  [3,16,6.676,-29.453,-23.815,7.564,-26.922,-21.957,8.183,-28.392,-21.354],
// 3 16 6.676 -29.453 -23.815 8.183 -28.392 -21.354 7.218 -30.949 -22.622
  [3,16,6.676,-29.453,-23.815,8.183,-28.392,-21.354,7.218,-30.949,-22.622],
// 3 16 5.05 -31.524 -24.844 6.676 -29.453 -23.815 7.218 -30.949 -22.622
  [3,16,5.05,-31.524,-24.844,6.676,-29.453,-23.815,7.218,-30.949,-22.622],
// 3 16 7.218 -30.949 -22.622 5.528 -33.415 -23.518 5.05 -31.524 -24.844
  [3,16,7.218,-30.949,-22.622,5.528,-33.415,-23.518,5.05,-31.524,-24.844],
// 3 16 5.05 -31.524 -24.844 5.528 -33.415 -23.518 2.765 -35.604 -24.49
  [3,16,5.05,-31.524,-24.844,5.528,-33.415,-23.518,2.765,-35.604,-24.49],
// 3 16 2.765 -35.604 -24.49 2.267 -33.215 -25.931 5.05 -31.524 -24.844
  [3,16,2.765,-35.604,-24.49,2.267,-33.215,-25.931,5.05,-31.524,-24.844],
// 3 16 3.872 -29.662 -25.69 5.858 -27.756 -24.389 6.676 -29.453 -23.815
  [3,16,3.872,-29.662,-25.69,5.858,-27.756,-24.389,6.676,-29.453,-23.815],
// 3 16 3.872 -29.662 -25.69 6.676 -29.453 -23.815 5.05 -31.524 -24.844
  [3,16,3.872,-29.662,-25.69,6.676,-29.453,-23.815,5.05,-31.524,-24.844],
// 3 16 5.858 -27.756 -24.389 7.564 -26.922 -21.957 6.676 -29.453 -23.815
  [3,16,5.858,-27.756,-24.389,7.564,-26.922,-21.957,6.676,-29.453,-23.815],
// 3 16 0 -33.549 -26.379 0 -29.499 -25.912 3.872 -29.662 -25.69
  [3,16,0,-33.549,-26.379,0,-29.499,-25.912,3.872,-29.662,-25.69],
// 3 16 2.267 -33.215 -25.931 0 -33.549 -26.379 3.872 -29.662 -25.69
  [3,16,2.267,-33.215,-25.931,0,-33.549,-26.379,3.872,-29.662,-25.69],
// 3 16 2.267 -33.215 -25.931 3.872 -29.662 -25.69 5.05 -31.524 -24.844
  [3,16,2.267,-33.215,-25.931,3.872,-29.662,-25.69,5.05,-31.524,-24.844],
// 
// 0 // Condlines Pattern Area
// 5 24 0 -40.413 -18.922 0 -42.499 -12.821 3.752 -40.374 -18.286 -3.752 -40.374 -18.286
  [5,24,0,-40.413,-18.922,0,-42.499,-12.821,3.752,-40.374,-18.286,-3.752,-40.374,-18.286],
// 5 24 0 -38.371 -21.91 0 -40.413 -18.922 2.961 -38.164 -22.064 -2.961 -38.164 -22.064
  [5,24,0,-38.371,-21.91,0,-40.413,-18.922,2.961,-38.164,-22.064,-2.961,-38.164,-22.064],
];
module ldraw_lib__29602(step=0, col=false, unit=2/5, alt=false, line=0.2, solid=!$preview)
    makepoly(ldraw_lib__29602(), step=step, col=col, unit=unit, alt=alt, line=line, solid=solid);
ldraw_lib__29602(line=0.2);
